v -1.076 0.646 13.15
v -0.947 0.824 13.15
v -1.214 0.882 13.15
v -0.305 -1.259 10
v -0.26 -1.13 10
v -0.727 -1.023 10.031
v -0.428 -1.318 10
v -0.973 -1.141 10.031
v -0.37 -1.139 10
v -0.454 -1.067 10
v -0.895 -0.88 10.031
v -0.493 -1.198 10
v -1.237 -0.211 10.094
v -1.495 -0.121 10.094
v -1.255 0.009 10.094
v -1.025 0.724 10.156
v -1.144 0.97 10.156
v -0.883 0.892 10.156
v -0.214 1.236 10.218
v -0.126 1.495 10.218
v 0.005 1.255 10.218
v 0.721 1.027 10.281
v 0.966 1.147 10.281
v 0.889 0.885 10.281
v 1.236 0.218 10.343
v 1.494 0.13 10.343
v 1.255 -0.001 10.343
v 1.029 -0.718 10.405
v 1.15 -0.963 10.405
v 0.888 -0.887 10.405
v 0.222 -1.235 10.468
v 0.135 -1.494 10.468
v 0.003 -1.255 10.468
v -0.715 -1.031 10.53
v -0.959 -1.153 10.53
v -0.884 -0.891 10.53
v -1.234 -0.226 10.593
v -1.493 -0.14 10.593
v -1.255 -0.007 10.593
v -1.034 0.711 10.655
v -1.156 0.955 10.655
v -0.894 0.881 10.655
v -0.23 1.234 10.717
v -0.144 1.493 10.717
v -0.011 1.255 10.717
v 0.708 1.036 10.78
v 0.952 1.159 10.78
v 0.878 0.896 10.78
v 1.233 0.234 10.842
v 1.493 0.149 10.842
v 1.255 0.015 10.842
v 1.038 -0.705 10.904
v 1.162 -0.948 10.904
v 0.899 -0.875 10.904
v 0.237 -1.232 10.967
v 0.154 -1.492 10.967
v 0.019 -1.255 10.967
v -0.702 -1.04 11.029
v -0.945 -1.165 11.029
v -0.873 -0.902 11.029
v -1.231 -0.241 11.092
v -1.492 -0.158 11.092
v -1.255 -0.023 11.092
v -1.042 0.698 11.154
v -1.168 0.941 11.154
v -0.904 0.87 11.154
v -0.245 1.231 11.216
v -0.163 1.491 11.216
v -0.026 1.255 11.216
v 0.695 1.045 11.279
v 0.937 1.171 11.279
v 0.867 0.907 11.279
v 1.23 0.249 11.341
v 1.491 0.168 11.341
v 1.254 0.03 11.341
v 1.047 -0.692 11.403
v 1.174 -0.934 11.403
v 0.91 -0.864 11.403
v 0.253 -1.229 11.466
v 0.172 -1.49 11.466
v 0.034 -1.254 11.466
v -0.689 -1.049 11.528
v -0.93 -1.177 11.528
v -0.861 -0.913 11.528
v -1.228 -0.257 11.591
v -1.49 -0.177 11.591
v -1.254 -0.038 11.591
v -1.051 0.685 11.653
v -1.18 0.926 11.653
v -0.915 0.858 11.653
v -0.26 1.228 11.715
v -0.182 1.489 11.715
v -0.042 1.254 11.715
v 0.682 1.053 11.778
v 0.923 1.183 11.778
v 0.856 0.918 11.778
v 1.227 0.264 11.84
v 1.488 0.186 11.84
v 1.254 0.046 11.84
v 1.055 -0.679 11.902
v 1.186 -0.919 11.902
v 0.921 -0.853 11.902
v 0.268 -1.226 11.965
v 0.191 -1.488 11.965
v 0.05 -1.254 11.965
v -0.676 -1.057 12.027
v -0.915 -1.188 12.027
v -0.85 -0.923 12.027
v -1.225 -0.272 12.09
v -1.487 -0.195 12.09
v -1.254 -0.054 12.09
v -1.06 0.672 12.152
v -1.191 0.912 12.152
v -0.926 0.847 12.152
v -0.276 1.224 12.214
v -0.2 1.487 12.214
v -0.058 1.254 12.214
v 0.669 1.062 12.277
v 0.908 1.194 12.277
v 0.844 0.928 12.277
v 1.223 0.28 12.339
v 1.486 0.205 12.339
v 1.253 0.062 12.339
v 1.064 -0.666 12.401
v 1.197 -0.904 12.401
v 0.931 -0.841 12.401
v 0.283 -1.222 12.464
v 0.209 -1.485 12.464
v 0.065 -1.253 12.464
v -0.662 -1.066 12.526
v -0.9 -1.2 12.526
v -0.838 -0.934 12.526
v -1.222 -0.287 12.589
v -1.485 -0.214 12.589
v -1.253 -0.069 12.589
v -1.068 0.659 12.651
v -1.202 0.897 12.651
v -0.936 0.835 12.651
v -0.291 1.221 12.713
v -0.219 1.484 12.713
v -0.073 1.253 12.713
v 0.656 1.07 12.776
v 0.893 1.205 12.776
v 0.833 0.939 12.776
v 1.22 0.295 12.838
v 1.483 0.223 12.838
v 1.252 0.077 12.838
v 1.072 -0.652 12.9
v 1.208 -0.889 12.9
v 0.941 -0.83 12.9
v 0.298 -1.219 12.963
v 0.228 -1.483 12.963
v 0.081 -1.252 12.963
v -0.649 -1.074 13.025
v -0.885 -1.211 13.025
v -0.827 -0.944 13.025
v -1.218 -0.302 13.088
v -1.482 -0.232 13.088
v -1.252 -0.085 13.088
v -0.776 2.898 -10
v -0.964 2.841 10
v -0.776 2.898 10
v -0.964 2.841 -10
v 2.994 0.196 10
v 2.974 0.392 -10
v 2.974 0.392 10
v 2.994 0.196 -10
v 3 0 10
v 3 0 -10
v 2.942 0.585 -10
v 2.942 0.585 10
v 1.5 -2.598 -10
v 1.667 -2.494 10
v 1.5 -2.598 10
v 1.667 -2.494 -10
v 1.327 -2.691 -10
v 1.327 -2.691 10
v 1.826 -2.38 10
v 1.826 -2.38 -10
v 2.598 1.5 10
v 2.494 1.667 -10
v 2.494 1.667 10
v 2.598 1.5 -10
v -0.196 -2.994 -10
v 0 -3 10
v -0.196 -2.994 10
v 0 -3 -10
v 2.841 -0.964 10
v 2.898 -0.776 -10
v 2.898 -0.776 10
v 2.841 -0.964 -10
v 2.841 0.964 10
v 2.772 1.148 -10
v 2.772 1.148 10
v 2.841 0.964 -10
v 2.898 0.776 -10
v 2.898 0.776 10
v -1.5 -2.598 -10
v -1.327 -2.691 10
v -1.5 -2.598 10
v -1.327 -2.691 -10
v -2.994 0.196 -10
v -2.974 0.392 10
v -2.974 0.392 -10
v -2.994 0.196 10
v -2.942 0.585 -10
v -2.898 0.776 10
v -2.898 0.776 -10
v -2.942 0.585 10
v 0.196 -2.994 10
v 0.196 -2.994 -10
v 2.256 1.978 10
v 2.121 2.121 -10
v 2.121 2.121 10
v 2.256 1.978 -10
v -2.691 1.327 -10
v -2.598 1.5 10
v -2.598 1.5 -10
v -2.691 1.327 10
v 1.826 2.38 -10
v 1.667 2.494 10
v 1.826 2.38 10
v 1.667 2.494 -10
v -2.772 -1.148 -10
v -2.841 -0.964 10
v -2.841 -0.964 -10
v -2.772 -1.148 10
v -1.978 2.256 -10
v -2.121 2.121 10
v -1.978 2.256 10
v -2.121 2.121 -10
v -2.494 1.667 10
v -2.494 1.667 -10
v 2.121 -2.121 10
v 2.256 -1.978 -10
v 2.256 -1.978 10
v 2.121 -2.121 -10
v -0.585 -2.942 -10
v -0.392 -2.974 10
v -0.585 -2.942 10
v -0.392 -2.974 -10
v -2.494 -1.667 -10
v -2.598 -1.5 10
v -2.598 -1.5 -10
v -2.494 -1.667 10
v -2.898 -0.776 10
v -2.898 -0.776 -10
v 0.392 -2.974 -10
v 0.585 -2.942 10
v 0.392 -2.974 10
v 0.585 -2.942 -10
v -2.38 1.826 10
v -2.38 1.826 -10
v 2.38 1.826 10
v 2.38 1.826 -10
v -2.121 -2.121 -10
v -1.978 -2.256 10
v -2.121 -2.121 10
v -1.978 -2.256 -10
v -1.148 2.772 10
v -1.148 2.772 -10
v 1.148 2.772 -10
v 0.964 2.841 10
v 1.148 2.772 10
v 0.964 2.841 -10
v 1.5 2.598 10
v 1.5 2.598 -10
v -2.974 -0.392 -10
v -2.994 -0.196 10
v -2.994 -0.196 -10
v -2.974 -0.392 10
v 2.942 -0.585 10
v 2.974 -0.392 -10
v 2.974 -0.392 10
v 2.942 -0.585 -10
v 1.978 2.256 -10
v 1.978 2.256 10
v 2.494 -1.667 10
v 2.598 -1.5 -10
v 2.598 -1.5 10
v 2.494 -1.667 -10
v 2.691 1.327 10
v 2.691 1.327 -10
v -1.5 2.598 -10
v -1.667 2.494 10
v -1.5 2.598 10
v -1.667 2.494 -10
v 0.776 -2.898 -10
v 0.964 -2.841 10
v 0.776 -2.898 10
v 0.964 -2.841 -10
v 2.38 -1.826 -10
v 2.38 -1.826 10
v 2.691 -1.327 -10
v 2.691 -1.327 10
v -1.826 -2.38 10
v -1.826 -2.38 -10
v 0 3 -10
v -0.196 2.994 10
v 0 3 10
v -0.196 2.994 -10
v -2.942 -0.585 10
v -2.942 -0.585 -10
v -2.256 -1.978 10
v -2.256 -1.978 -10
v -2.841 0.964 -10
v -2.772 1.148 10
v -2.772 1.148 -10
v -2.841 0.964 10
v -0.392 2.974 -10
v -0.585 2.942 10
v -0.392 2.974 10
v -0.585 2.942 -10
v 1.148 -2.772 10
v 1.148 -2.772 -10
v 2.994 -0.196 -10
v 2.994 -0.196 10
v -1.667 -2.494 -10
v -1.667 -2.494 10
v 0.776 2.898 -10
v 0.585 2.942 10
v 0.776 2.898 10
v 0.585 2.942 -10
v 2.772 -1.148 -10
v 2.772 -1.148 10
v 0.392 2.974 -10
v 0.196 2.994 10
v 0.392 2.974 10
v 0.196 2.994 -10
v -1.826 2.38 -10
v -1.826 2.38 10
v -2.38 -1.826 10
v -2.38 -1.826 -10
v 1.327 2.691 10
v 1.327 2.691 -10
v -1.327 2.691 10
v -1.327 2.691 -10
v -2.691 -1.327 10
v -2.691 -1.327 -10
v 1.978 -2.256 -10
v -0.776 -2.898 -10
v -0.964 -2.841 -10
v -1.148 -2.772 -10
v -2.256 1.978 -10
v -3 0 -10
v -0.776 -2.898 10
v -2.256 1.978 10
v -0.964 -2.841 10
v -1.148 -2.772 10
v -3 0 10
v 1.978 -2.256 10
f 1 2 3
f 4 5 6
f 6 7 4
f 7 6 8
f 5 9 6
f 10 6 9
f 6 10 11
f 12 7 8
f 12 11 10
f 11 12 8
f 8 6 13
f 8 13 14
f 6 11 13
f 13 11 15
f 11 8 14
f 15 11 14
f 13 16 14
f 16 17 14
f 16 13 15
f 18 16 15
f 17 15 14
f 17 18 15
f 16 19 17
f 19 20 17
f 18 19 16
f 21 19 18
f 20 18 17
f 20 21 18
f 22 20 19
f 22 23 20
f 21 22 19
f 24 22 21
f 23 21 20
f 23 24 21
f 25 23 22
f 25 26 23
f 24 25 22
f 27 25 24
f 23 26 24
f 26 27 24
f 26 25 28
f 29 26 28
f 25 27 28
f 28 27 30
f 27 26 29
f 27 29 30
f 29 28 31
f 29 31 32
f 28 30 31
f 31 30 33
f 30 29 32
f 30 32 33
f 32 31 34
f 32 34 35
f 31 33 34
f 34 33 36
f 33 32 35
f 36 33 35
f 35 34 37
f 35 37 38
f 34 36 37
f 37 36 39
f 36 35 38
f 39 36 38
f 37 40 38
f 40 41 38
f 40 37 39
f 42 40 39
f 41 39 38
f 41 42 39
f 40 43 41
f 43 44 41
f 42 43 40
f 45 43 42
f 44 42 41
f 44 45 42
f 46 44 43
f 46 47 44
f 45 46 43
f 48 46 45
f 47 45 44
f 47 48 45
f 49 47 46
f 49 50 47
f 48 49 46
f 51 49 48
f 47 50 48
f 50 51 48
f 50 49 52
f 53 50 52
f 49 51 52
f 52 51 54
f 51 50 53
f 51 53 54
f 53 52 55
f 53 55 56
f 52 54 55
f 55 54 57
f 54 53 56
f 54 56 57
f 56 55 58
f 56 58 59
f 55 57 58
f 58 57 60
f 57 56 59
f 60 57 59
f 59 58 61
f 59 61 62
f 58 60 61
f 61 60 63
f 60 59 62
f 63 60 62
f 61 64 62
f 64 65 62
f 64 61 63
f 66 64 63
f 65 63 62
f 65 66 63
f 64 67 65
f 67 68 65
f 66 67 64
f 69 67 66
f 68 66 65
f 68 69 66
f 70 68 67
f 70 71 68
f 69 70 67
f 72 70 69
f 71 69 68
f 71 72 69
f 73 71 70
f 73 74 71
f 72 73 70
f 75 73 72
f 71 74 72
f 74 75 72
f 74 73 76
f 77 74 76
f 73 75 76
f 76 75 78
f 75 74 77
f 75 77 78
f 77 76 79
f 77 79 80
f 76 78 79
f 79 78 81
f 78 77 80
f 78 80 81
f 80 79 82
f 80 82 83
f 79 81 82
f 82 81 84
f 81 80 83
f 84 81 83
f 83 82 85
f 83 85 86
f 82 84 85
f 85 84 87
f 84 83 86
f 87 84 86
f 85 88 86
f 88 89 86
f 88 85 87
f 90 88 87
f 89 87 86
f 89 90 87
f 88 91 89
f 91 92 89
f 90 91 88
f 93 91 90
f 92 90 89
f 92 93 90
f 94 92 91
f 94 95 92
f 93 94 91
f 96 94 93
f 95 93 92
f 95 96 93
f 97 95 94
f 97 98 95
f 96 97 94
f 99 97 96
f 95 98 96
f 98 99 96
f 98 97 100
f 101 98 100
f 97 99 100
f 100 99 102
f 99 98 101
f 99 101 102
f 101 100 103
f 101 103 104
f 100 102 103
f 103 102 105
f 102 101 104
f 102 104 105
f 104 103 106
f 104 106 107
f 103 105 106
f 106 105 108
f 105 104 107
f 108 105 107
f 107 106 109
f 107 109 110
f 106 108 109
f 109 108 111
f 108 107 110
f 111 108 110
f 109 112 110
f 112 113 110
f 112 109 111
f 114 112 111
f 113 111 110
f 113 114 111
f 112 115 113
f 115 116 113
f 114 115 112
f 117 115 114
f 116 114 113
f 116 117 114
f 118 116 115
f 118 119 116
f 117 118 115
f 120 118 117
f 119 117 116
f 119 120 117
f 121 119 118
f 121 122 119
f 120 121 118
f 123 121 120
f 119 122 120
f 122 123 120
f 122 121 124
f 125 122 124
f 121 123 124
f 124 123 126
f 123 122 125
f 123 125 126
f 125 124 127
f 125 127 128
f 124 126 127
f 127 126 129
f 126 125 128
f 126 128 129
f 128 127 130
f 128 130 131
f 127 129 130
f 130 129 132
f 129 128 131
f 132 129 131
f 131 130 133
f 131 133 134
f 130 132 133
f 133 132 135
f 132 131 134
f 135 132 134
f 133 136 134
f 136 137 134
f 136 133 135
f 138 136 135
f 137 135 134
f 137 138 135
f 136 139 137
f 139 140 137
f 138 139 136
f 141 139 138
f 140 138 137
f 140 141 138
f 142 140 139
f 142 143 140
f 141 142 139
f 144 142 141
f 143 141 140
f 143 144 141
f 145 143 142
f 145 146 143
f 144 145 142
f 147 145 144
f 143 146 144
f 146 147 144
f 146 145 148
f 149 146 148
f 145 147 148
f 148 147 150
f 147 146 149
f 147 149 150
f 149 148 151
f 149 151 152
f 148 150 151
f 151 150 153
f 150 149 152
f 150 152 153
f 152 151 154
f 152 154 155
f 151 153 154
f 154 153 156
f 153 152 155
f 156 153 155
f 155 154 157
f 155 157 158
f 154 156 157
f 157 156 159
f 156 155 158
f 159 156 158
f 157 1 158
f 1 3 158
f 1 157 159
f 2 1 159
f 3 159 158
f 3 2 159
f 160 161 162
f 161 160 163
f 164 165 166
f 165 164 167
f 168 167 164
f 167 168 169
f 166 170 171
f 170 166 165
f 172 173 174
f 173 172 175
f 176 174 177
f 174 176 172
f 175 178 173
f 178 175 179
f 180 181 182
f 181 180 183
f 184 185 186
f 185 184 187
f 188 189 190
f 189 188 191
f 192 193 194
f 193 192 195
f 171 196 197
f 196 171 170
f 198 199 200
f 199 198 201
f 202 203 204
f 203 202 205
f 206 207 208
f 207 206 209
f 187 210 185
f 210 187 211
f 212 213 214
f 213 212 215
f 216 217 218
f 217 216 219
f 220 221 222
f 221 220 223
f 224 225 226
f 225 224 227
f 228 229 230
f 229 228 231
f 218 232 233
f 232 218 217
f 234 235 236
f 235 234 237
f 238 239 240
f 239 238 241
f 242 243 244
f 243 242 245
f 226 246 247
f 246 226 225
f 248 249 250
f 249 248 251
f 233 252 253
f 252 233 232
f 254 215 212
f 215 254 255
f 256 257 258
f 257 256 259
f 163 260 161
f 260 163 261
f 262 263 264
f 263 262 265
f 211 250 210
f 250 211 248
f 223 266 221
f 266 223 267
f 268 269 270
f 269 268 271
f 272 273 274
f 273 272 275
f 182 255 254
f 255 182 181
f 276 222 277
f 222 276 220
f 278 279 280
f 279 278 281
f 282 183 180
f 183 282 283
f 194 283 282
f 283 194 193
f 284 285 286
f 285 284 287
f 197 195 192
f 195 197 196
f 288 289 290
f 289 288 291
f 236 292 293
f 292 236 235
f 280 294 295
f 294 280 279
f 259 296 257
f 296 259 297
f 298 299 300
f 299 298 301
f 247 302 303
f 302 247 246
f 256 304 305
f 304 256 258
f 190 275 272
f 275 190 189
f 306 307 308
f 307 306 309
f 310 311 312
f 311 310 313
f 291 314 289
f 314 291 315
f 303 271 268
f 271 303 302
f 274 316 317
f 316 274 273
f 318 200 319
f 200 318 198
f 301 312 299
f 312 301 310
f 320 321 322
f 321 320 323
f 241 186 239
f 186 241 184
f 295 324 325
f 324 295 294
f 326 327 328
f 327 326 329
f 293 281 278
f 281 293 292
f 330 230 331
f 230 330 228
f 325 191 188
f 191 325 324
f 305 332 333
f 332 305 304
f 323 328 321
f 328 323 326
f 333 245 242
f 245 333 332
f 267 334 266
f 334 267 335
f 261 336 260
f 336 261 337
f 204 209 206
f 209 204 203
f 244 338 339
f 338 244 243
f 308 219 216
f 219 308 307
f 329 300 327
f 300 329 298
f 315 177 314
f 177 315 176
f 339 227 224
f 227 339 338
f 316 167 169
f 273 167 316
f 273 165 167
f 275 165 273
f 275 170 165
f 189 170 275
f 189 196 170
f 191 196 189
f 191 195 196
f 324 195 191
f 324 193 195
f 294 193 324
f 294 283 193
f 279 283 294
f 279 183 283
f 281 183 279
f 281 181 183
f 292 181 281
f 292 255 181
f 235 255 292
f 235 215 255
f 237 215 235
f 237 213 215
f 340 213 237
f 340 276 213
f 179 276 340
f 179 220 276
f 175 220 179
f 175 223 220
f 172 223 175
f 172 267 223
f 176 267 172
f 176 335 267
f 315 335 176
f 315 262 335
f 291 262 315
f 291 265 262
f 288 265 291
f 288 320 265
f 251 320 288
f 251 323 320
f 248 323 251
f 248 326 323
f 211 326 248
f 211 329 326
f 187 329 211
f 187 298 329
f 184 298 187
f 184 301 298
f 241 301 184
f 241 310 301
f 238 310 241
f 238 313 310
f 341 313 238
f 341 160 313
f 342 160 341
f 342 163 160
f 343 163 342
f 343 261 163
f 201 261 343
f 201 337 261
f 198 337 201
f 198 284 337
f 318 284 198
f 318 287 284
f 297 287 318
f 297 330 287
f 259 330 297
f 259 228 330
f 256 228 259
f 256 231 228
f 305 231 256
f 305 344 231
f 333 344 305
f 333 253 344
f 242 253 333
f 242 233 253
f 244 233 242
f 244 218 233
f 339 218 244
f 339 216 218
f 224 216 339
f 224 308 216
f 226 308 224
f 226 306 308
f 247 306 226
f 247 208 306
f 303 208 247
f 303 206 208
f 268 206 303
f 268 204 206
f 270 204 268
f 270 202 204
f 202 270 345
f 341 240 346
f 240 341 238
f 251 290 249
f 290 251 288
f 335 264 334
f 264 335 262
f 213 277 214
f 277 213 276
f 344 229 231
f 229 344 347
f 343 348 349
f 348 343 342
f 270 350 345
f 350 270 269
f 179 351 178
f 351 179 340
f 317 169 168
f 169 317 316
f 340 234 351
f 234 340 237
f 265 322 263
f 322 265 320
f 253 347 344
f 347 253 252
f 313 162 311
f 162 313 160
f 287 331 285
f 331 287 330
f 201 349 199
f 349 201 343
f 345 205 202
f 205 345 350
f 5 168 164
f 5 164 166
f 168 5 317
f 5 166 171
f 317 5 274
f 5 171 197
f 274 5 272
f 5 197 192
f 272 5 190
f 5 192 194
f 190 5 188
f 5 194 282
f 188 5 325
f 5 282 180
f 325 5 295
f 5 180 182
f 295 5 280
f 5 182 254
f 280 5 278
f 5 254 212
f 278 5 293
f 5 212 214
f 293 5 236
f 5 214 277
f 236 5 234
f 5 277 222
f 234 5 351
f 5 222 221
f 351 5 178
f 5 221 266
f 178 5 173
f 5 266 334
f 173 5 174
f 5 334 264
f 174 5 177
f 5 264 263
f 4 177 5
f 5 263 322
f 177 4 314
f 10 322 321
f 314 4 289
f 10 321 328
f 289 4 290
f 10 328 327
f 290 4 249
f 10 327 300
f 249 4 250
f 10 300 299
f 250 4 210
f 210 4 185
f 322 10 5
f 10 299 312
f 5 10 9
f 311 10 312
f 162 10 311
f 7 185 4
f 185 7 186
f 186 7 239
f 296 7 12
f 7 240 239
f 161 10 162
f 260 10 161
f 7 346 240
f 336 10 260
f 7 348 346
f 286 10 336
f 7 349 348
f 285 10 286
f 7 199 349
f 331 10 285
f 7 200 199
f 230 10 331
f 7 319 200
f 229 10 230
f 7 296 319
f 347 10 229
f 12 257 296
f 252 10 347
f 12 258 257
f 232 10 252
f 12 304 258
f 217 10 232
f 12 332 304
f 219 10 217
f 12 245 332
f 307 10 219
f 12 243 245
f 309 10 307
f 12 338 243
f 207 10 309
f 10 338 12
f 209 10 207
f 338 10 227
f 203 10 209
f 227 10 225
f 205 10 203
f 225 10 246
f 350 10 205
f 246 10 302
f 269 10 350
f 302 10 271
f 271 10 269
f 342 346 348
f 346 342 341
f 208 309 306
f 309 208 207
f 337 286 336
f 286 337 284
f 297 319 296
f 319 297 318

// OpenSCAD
// Standoff pillar, M3 external threads both ends, 20mm overall length.
// "Nonemm diameter" is undefined -> expose body_d_mm parameter for user to set.

$fn = 96;

// -------- Parameters --------
thread_major_d_mm = 3.0;     // M3 major diameter
length_mm         = 20.0;    // overall length
body_d_mm         = 6.0;     // standoff outer diameter (set as needed)

thread_len_top_mm    = 6.0;
thread_len_bottom_mm = 6.0;

chamfer_h_mm   = 0.8;
chamfer_drop_mm = 0.6;

// Visual thread parameters (not a standards-accurate ISO thread, but sized to M3 major dia)
thread_pitch_mm = 0.5;
thread_depth_mm = 0.25;

eps = 0.02;

// -------- Thread (visual) --------
module external_thread(major_d, pitch, depth, len) {
    major_r = major_d/2;
    minor_r = max(major_r - depth, 0.01);

    union() {
        // core at minor diameter
        cylinder(h=len, r=minor_r, center=true);

        // helical ridge up to major diameter
        linear_extrude(
            height=len,
            twist=360*len/pitch,
            slices=max(ceil(len*16), 32),
            convexity=10
        )
        translate([minor_r, 0, 0])
            polygon(points=[
                [0, -pitch*0.22],
                [major_r - minor_r, 0],
                [0,  pitch*0.22]
            ]);
    }
}

// -------- Standoff --------
module standoff() {
    body_r = body_d_mm/2;

    // Clamp thread lengths to fit within total length
    tbot = min(thread_len_bottom_mm, length_mm/2);
    ttop = min(thread_len_top_mm,    length_mm/2);

    // Ensure body is at least as large as thread major diameter
    body_r_eff = max(body_r, thread_major_d_mm/2);

    cham_h = min(chamfer_h_mm, length_mm/2);
    cham_r2 = max(body_r_eff - chamfer_drop_mm, 0.01);

    overlap = 0.3; // guarantees one connected solid

    union() {
        // Main body
        cylinder(h=length_mm, r=body_r_eff, center=true);

        // Bottom thread (connected via overlap)
        translate([0, 0, -length_mm/2 + tbot/2 + overlap/2])
            external_thread(thread_major_d_mm, thread_pitch_mm, thread_depth_mm, tbot + overlap);

        // Top thread (connected via overlap)
        translate([0, 0,  length_mm/2 - ttop/2 - overlap/2])
            external_thread(thread_major_d_mm, thread_pitch_mm, thread_depth_mm, ttop + overlap);

        // Bottom chamfer
        translate([0, 0, -length_mm/2 + cham_h/2 + eps])
            cylinder(h=cham_h + eps, r1=body_r_eff, r2=cham_r2, center=true);

        // Top chamfer
        translate([0, 0,  length_mm/2 - cham_h/2 - eps])
            cylinder(h=cham_h + eps, r1=cham_r2, r2=body_r_eff, center=true);
    }
}

standoff();
